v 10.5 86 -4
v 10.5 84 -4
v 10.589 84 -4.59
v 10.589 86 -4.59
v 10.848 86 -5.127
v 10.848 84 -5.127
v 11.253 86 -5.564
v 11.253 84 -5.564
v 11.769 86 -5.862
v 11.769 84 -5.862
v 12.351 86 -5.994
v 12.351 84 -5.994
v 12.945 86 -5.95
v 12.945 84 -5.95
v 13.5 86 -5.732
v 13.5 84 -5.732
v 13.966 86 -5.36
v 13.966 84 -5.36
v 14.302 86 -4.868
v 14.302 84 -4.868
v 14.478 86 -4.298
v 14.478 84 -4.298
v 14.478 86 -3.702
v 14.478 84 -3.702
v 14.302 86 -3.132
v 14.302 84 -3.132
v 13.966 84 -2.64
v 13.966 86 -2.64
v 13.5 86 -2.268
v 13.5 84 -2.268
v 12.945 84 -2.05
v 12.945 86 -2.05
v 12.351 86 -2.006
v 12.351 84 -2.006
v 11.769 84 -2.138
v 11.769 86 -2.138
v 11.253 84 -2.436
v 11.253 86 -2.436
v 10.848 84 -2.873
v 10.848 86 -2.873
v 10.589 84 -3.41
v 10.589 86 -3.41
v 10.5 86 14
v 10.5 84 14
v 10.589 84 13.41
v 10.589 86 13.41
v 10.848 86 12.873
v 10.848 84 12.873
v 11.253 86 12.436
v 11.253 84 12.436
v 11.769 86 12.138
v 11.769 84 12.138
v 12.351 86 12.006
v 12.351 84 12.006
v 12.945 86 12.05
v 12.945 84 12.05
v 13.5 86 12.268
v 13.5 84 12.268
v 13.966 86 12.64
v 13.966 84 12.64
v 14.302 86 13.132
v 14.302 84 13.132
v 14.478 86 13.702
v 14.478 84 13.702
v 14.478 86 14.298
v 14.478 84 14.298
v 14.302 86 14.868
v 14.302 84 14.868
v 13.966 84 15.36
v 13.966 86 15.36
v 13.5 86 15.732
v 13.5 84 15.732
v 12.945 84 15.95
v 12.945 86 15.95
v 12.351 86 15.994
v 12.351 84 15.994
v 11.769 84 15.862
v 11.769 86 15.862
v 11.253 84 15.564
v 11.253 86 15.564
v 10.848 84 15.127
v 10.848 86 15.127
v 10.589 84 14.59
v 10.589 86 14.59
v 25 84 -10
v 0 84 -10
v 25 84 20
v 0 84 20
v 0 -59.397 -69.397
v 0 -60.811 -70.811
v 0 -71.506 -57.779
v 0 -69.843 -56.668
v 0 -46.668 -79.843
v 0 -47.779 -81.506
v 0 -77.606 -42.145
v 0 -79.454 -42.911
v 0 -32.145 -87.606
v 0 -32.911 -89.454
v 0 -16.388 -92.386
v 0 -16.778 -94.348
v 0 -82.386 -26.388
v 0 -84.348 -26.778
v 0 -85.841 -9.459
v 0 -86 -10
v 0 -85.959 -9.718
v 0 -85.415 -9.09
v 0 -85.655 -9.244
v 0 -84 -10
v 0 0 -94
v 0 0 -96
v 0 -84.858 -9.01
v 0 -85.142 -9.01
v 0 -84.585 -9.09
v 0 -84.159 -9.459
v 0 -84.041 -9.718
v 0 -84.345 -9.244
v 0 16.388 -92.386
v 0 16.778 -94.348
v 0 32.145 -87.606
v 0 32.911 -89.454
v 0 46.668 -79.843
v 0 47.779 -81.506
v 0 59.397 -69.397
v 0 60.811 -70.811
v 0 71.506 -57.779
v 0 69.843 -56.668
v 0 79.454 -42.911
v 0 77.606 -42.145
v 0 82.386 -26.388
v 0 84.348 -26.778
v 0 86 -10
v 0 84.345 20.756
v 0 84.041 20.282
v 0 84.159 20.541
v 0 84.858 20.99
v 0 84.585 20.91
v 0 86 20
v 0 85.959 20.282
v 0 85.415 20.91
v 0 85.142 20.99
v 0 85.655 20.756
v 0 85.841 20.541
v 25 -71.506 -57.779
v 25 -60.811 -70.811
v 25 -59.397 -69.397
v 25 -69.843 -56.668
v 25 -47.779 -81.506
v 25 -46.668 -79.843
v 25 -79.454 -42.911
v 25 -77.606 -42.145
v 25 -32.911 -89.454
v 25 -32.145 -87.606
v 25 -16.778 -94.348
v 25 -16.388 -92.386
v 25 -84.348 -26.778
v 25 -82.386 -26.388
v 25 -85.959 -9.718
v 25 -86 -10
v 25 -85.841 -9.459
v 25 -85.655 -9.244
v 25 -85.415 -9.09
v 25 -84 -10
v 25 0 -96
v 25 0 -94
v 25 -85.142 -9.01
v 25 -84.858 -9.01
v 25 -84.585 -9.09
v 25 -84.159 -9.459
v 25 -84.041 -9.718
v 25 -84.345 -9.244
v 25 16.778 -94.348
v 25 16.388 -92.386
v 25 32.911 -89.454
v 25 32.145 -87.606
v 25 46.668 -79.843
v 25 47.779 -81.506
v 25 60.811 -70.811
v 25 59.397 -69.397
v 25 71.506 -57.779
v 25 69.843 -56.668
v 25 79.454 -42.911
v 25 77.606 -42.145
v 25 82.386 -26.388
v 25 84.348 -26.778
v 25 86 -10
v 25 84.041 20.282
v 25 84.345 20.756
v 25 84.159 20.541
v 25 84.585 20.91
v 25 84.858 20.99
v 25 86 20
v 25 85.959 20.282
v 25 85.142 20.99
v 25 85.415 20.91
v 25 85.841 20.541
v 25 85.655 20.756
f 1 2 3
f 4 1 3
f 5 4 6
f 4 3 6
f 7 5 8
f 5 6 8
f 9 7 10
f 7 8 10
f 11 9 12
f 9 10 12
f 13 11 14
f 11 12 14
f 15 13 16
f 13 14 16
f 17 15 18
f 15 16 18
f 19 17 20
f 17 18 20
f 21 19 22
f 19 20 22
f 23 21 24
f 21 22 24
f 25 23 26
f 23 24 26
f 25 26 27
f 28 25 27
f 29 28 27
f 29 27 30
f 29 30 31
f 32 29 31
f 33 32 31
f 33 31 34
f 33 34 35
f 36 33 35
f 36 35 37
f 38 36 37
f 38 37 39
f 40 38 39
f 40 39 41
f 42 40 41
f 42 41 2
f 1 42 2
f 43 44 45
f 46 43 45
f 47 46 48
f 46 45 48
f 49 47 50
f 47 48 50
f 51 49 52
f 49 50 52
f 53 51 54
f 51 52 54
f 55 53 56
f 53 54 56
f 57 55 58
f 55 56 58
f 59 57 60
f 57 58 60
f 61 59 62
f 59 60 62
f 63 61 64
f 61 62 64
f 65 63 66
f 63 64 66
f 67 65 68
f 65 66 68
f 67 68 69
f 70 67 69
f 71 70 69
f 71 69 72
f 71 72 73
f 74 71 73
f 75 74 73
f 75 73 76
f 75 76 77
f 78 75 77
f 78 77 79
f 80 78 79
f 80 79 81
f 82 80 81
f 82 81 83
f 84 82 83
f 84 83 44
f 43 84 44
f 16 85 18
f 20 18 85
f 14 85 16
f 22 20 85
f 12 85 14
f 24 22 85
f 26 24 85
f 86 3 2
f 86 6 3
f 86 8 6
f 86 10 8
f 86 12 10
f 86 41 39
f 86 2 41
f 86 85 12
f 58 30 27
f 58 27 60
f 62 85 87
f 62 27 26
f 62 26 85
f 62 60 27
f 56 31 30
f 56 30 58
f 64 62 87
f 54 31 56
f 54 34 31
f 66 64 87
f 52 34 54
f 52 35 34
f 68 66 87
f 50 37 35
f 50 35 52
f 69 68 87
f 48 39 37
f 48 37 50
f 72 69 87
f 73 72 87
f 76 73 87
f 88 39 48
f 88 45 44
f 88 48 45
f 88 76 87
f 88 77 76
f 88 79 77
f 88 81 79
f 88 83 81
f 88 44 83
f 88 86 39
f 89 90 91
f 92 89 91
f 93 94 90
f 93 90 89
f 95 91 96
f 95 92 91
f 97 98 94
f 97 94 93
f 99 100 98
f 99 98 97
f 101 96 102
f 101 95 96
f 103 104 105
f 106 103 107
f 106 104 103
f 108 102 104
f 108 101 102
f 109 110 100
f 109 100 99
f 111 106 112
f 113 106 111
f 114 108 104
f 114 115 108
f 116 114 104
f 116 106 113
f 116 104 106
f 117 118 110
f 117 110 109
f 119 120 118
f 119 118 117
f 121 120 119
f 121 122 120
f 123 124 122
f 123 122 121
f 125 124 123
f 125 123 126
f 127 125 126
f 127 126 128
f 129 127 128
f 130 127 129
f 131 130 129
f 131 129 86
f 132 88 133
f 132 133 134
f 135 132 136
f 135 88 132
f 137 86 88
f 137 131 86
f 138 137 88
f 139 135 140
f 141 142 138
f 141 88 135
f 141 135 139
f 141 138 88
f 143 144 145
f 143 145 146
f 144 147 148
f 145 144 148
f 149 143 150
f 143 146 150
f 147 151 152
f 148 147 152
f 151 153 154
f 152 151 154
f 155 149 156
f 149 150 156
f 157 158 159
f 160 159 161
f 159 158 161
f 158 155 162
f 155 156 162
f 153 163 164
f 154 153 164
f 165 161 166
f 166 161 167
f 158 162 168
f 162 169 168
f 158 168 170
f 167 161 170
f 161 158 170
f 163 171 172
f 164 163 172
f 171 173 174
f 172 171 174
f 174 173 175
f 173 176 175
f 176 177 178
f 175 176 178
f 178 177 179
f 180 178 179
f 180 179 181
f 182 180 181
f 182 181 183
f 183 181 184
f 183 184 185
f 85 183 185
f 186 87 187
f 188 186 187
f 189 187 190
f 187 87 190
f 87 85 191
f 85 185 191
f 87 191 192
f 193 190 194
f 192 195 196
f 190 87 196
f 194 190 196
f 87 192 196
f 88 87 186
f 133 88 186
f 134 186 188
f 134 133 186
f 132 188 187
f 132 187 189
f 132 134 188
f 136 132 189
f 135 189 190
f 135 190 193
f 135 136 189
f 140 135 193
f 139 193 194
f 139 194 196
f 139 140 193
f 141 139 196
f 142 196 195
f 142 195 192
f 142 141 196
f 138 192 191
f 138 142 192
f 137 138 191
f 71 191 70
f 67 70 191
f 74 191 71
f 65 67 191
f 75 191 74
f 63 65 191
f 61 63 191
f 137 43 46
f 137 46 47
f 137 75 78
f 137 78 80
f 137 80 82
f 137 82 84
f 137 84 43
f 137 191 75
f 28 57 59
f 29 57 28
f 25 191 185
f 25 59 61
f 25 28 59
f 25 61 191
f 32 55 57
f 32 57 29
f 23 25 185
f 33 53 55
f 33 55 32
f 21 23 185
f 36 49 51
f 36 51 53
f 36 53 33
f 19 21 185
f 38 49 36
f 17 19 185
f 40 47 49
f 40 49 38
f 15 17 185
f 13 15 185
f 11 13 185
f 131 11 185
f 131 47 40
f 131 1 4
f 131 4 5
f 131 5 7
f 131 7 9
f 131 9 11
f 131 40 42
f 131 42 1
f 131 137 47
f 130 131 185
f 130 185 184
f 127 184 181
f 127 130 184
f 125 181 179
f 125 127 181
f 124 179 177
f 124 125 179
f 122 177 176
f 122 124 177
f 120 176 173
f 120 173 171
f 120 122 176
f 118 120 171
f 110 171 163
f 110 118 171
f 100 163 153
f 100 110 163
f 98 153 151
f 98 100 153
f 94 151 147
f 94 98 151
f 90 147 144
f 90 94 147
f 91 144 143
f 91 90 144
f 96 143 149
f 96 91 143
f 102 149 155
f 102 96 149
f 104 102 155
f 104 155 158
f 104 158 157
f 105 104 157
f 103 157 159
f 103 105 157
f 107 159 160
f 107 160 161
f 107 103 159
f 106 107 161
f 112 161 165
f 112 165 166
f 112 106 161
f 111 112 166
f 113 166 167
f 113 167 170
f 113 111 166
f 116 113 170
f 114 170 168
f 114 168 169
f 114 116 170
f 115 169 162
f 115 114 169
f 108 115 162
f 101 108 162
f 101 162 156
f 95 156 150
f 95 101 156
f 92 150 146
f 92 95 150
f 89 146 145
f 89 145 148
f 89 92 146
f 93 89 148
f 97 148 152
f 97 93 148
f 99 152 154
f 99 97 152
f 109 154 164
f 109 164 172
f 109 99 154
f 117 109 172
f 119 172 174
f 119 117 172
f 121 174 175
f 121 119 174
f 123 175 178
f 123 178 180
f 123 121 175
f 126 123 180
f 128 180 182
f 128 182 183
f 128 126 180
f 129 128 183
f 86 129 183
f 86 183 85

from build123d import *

# Parameters (mm, degrees)
BOSS_EXTRUDE1_DEPTH       = 25
F_4_0MM_DOWEL_HOLE1_D     = 4
F_4_0MM_DOWEL_HOLE1_DEPTH = 17.29
F_4_0MM_DOWEL_HOLE1_TIP   = 1.201721238


with BuildPart() as part:
    # Sketch1 → Boss-Extrude1 (new body)
    with BuildSketch(Plane(origin=(0, 0, 0), x_dir=(0, 0, -1), z_dir=(1, 0, 0))):
        with BuildLine():
            Line((10, 84), (-20, 84))
            ThreePointArc((-20, 84), (-21, 85), (-20, 86))
            Line((-20, 86), (10, 86))
            ThreePointArc((10, 86), (96, 0), (10, -86))
            ThreePointArc((10, -86), (9, -85), (10, -84))
            ThreePointArc((10, -84), (94, 0), (10, 84))
        make_face()
    extrude(amount=BOSS_EXTRUDE1_DEPTH)

    # Ø4.0mm Dowel Hole1
    with Locations(Plane(origin=(0, 86, 0), x_dir=(1, 0, 0), z_dir=(0, 1, 0))):
        with Locations((12.5, -14), (12.5, 4)):
            Hole(F_4_0MM_DOWEL_HOLE1_D / 2, depth=F_4_0MM_DOWEL_HOLE1_DEPTH)
            with Locations((0, 0, -(F_4_0MM_DOWEL_HOLE1_DEPTH + F_4_0MM_DOWEL_HOLE1_TIP / 2))):  # 118° drill point
                Cone(0, F_4_0MM_DOWEL_HOLE1_D / 2, F_4_0MM_DOWEL_HOLE1_TIP, mode=Mode.SUBTRACT)


solid = part.part
